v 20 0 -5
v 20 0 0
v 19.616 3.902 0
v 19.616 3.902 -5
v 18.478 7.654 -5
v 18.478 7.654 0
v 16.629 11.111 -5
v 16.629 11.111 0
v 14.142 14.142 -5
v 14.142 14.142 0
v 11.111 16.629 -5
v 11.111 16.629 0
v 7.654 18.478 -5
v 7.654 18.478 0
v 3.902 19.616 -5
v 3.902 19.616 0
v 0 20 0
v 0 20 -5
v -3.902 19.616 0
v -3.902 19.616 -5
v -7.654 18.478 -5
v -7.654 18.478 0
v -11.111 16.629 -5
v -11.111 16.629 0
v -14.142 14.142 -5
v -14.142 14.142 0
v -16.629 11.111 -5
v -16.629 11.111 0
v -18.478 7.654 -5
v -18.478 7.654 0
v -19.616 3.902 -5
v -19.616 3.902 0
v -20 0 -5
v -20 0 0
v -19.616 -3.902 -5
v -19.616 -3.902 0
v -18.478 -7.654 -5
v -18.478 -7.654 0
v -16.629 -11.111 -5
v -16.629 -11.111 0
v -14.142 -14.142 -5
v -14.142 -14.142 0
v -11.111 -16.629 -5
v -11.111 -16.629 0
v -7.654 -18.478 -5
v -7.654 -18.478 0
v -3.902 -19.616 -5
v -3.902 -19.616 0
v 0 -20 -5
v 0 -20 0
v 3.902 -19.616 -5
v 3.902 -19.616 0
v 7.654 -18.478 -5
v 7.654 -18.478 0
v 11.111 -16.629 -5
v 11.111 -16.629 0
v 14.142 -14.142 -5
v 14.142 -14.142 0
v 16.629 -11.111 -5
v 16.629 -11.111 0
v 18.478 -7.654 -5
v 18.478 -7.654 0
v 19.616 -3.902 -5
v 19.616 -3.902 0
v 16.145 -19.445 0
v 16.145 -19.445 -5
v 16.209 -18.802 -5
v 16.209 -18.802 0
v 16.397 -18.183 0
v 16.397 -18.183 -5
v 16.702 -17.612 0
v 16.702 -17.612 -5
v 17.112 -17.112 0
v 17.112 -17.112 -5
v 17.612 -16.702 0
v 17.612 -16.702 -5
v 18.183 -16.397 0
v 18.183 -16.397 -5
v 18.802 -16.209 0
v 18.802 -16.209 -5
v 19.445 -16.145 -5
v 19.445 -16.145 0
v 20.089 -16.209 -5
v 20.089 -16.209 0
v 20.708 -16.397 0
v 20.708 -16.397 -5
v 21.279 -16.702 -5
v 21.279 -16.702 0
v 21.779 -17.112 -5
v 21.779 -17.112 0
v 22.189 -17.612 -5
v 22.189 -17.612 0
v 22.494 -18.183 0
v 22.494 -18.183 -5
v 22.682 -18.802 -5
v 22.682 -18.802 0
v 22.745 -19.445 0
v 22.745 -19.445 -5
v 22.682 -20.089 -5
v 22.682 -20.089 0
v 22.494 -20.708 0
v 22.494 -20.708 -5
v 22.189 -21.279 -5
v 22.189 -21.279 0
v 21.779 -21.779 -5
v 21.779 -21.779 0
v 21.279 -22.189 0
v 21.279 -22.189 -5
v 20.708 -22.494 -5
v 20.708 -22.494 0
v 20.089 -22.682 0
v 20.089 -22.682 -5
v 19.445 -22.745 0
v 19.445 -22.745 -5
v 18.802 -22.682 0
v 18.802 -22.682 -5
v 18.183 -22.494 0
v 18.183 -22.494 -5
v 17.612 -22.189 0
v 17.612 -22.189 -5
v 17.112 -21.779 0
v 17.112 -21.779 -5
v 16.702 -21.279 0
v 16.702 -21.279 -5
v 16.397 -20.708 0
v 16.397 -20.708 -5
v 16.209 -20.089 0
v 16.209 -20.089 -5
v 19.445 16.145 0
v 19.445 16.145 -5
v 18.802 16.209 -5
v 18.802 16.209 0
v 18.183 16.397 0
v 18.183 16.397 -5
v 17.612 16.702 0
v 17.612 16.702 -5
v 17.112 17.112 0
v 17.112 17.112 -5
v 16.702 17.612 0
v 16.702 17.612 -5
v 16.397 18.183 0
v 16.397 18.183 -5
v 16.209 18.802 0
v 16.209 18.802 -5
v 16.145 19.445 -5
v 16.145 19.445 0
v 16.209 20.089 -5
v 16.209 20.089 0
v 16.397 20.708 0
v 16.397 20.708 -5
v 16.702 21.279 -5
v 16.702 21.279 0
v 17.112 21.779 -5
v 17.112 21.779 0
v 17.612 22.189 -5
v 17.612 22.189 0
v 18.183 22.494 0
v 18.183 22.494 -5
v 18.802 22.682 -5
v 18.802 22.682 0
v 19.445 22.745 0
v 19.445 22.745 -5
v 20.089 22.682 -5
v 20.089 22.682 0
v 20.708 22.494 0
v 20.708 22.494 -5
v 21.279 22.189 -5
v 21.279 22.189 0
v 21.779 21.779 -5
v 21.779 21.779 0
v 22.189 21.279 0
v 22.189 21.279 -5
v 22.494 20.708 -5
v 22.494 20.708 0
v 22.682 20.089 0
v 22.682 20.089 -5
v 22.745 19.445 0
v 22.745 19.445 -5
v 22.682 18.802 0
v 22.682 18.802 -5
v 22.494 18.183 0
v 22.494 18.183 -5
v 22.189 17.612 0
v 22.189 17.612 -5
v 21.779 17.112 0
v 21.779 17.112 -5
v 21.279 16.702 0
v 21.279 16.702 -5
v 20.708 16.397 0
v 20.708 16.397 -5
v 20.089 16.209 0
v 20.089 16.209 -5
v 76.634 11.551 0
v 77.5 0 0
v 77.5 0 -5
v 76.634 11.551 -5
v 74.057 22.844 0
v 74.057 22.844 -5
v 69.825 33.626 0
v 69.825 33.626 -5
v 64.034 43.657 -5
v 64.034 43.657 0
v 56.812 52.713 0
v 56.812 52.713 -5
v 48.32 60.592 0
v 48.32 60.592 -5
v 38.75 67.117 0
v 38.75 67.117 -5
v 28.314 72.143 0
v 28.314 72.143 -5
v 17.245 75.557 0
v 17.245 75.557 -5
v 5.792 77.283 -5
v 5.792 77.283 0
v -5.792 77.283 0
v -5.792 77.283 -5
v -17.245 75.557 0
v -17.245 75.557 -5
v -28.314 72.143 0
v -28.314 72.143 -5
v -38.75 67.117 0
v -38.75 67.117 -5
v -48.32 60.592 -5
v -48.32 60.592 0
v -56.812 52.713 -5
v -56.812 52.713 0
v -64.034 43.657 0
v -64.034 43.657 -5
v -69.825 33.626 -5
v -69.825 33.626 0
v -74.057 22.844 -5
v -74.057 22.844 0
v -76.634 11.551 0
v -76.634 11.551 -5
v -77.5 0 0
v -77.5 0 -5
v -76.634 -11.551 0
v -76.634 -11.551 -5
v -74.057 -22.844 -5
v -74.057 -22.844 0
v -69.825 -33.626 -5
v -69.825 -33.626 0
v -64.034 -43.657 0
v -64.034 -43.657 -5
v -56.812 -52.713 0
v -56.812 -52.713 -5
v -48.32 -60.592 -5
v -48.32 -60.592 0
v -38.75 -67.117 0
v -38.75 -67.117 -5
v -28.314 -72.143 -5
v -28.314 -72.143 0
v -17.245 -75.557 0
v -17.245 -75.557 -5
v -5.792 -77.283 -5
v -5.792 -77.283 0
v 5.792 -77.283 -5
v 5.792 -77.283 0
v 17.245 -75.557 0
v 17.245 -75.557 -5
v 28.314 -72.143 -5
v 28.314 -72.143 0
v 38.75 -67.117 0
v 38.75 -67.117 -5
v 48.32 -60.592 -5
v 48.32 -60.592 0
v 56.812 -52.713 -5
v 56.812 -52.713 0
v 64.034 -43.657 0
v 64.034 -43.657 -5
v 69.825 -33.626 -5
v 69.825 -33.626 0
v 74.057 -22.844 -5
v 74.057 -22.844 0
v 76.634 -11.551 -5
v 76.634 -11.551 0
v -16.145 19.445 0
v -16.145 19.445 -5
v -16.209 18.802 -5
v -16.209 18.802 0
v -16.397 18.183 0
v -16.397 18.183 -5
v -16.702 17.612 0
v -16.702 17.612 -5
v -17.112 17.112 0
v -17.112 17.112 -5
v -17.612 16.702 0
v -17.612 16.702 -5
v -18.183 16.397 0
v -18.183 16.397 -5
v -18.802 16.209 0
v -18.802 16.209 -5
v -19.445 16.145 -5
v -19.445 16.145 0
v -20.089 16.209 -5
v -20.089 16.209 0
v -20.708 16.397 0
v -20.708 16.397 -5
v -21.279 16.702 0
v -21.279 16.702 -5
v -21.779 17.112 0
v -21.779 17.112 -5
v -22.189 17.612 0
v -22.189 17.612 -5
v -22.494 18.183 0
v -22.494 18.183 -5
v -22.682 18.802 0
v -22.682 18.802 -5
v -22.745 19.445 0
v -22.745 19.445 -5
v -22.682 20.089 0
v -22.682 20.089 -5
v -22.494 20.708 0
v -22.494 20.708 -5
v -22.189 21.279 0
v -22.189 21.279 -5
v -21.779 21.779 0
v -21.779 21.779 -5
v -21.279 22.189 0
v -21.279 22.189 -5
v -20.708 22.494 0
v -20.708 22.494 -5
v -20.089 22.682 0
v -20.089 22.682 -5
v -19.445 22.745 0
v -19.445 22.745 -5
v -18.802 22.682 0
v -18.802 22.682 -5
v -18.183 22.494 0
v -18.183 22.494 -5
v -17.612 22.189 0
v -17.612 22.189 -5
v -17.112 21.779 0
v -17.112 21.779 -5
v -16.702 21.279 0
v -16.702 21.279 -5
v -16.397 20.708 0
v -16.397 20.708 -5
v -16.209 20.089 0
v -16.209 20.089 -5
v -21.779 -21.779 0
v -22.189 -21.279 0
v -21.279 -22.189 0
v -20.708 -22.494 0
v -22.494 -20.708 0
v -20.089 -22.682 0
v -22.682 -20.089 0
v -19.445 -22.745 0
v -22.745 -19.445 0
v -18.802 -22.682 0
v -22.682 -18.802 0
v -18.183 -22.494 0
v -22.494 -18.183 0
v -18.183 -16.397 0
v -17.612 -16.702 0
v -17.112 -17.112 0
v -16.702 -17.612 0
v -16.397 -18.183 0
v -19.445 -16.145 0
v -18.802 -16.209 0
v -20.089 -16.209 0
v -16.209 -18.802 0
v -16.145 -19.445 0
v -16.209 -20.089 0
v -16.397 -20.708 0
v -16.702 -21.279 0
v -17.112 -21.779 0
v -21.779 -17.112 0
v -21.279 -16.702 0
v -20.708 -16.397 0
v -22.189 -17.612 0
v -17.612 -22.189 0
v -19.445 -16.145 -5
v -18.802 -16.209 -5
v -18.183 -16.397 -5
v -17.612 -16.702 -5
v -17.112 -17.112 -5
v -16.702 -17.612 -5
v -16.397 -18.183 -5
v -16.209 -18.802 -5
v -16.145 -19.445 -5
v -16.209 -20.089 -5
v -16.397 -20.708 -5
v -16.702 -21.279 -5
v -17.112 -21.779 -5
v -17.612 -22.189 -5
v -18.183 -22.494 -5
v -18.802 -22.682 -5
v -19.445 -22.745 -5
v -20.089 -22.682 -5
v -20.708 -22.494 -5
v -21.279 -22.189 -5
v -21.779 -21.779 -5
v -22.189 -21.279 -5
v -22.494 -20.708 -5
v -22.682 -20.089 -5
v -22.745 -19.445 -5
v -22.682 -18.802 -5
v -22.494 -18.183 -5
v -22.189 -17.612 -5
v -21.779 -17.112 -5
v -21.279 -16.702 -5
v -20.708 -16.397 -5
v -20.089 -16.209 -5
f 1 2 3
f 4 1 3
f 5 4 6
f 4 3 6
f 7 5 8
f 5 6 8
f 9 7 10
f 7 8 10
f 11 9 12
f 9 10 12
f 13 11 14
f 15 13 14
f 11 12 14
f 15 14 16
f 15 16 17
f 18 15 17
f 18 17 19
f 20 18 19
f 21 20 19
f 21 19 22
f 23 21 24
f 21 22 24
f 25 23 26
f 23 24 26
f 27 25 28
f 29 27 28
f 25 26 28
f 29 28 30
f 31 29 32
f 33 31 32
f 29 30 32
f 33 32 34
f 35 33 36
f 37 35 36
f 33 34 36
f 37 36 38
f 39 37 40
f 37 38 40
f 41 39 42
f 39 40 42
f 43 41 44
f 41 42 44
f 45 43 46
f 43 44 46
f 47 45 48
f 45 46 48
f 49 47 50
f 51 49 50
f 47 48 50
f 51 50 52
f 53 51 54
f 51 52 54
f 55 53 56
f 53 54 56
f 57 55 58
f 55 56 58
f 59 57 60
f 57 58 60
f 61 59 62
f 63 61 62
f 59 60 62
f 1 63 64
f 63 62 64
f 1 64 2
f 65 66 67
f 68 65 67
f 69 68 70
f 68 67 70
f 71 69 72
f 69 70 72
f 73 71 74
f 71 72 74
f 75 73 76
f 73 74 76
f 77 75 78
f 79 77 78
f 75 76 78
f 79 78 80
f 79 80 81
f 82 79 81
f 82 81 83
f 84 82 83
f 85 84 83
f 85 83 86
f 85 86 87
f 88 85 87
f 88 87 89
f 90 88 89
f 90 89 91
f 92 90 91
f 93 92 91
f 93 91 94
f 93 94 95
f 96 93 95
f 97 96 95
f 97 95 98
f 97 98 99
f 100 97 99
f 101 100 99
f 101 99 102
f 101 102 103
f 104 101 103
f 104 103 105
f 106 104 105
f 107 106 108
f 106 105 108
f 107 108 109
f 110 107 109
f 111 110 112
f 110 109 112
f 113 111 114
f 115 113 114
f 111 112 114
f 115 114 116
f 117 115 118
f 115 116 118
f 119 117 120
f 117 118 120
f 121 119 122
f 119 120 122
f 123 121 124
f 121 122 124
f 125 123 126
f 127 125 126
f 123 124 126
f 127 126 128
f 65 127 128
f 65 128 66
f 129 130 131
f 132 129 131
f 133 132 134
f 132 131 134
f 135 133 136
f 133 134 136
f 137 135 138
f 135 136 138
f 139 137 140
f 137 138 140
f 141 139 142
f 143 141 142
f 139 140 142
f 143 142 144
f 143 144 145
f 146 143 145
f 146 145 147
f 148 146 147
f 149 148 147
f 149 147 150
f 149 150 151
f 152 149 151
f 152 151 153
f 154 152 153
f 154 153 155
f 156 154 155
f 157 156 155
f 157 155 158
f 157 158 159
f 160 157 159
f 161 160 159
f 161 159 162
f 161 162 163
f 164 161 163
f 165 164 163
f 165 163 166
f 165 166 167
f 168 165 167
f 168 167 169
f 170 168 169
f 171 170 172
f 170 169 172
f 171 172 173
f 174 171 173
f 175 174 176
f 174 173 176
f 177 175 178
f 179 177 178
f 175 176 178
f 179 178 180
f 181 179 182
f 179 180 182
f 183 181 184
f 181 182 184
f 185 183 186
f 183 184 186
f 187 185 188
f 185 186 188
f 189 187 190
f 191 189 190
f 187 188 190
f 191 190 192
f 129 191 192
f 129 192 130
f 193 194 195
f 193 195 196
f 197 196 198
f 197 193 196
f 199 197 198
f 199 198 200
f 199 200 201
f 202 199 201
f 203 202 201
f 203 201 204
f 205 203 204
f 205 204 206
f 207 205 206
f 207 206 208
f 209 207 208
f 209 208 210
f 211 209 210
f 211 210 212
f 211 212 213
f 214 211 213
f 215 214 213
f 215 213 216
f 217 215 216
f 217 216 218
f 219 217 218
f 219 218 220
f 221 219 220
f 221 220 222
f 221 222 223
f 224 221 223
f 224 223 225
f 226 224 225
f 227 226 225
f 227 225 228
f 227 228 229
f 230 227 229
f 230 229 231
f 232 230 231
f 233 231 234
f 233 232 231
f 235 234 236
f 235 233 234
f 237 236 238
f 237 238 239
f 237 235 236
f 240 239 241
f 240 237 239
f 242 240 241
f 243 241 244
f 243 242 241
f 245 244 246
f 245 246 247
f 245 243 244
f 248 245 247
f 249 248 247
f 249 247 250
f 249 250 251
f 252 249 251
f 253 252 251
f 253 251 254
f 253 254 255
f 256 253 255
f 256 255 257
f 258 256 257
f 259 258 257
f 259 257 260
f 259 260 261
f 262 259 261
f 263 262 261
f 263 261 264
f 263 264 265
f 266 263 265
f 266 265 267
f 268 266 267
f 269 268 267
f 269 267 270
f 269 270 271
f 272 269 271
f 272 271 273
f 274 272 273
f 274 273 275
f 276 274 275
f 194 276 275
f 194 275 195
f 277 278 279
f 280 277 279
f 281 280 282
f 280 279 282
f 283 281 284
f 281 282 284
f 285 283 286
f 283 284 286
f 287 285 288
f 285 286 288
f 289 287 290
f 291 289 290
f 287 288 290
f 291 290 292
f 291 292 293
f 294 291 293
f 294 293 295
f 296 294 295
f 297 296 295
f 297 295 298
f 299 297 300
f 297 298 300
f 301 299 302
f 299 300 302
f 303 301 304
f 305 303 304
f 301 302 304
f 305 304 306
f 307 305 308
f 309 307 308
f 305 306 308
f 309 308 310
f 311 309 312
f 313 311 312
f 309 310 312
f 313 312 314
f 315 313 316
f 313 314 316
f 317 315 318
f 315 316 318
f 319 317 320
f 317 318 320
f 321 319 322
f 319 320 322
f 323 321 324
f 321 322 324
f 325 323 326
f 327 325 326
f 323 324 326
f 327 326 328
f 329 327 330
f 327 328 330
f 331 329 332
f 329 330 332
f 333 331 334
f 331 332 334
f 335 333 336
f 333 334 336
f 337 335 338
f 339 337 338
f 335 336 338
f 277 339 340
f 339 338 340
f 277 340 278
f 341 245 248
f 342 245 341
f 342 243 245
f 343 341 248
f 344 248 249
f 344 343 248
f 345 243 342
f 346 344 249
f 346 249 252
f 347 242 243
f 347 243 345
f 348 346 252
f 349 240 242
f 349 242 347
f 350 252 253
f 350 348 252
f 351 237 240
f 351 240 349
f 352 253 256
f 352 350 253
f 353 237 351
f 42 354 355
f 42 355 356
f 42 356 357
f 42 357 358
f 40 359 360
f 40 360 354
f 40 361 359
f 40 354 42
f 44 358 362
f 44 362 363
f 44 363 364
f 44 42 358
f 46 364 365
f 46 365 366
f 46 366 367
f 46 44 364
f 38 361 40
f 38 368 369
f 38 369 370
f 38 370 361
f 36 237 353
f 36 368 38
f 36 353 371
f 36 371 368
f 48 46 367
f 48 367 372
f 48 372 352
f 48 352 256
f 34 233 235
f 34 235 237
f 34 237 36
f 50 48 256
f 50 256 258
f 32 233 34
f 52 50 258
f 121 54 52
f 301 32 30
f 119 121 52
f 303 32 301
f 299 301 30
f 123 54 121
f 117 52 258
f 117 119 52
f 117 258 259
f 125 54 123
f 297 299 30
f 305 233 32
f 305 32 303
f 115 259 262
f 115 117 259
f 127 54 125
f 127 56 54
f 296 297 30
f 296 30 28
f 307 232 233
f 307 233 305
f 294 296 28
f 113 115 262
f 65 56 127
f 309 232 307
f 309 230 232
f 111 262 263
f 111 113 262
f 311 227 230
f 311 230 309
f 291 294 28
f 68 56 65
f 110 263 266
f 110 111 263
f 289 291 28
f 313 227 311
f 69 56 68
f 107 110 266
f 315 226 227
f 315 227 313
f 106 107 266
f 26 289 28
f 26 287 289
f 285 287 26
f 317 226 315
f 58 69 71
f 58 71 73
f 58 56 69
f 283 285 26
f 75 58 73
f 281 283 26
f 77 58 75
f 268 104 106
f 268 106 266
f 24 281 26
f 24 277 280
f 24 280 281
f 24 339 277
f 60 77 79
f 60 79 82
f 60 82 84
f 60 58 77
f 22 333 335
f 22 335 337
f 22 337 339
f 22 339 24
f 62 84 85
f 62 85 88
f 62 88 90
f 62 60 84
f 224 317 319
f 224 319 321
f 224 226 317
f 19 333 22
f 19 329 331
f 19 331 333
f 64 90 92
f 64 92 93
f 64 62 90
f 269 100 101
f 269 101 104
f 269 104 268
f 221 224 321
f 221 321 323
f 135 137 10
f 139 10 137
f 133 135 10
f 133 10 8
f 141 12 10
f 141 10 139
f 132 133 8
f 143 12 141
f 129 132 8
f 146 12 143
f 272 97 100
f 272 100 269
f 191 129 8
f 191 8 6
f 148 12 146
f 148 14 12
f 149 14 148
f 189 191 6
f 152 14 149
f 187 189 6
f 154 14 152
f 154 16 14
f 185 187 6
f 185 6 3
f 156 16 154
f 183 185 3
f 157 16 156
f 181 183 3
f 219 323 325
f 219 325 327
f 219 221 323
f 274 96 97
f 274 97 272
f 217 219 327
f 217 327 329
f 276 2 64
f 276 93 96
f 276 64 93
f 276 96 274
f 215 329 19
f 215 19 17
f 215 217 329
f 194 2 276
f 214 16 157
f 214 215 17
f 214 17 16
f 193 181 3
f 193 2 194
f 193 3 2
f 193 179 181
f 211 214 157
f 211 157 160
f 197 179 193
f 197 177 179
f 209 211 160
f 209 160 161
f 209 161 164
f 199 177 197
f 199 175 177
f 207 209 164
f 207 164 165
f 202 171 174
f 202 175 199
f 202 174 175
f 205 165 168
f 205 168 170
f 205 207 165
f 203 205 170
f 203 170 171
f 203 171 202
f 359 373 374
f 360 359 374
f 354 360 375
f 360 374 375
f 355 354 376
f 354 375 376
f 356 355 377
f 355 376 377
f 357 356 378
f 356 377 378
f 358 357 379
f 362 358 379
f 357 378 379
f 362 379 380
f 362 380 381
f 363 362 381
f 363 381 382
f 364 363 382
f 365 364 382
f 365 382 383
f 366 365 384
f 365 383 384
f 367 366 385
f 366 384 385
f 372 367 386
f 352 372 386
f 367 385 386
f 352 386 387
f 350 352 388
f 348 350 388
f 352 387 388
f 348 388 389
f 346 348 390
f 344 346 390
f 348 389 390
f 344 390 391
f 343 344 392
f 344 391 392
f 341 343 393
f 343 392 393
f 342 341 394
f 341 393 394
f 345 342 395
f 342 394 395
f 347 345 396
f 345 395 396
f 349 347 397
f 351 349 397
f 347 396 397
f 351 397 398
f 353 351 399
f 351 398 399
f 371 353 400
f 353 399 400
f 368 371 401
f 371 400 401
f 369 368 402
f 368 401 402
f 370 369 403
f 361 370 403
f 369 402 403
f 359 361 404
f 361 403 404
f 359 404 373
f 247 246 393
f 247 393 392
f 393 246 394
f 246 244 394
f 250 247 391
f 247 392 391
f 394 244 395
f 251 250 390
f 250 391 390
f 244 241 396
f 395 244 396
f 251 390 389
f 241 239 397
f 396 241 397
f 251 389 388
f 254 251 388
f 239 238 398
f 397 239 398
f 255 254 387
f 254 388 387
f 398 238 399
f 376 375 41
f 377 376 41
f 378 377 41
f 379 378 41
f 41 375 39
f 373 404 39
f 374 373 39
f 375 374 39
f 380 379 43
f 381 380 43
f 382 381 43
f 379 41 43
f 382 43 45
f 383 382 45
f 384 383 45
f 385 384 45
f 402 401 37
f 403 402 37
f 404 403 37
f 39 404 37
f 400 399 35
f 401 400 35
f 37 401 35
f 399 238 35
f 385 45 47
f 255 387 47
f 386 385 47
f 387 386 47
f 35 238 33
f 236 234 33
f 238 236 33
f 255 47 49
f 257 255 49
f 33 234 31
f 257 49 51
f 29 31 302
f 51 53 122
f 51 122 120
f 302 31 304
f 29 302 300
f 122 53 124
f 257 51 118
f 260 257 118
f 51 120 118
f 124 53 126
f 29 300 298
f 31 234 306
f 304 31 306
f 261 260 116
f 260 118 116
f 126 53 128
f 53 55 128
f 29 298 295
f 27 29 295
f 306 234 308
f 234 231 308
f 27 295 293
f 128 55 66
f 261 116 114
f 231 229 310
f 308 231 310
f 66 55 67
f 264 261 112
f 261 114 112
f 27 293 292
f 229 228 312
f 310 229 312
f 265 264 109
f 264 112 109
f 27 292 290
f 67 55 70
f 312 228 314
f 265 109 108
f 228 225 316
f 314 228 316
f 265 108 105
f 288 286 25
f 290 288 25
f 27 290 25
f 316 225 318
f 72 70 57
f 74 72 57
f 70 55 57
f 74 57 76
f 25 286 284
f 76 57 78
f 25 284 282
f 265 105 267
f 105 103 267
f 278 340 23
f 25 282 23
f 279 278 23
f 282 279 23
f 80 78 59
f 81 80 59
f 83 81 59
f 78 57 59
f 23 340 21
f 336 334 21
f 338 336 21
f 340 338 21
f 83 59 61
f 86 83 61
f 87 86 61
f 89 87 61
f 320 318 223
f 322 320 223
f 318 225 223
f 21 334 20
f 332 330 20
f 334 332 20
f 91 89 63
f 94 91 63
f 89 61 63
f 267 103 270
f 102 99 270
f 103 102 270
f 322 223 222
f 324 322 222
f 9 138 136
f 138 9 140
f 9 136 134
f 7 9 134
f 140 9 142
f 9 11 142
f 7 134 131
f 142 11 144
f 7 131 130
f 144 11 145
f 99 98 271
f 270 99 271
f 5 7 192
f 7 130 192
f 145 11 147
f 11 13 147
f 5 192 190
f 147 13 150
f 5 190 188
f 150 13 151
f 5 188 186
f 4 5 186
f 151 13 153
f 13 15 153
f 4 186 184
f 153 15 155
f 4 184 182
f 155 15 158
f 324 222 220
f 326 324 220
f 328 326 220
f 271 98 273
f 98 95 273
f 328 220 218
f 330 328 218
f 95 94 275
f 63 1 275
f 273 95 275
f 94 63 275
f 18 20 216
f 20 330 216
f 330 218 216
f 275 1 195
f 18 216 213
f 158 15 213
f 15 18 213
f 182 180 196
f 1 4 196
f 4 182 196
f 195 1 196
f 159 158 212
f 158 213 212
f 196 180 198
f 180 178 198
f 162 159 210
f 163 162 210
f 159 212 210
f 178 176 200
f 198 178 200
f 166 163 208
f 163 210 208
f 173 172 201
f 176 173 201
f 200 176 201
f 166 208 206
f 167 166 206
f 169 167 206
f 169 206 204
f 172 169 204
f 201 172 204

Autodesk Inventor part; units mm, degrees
ref_plane "YZ Plane" through (0, 0, 0) normal (1, 0, 0) x (0, 1, 0)
ref_plane "XY Plane" through (0, 0, 0) normal (0, 0, 1) x (1, 0, 0)
sketch "Esquisse1" plane through (0, 0, 0) normal (0, 0, 1) x (1, 0, 0)
  circle A0 centre (0, 0) radius 77.5
  circle A1 centre (0, 0) radius 20
  dimension "d0" = 155
  dimension "d1" = 40
extrude "Extrusion1" add sketch "Esquisse1" against normal blind 5
sketch "Esquisse2" plane through (0, 0, 0) normal (0, 0, 1) x (1, 0, 0)
  circle A0 centre (0, 0) radius 27.5
  line L0 (0, 0) -> (35.9549, 35.9549)
  line L1 (-108.5, 0) -> (108.5, 0) projected
  point P0 (19.4454, 19.4454)
  dimension "d11" = 55
  dimension "d15" = 45
hole "Perçage1" at (19.4454, 19.4454, 0) direction (0, 0, -1) diameter 6.6 end through all
pattern_circular "Réseau circulaire1" count 4 over 360 about axis through (0, 0, 0) along (0, 0, -1) of "Perçage1"
properties part number "Flasque"
